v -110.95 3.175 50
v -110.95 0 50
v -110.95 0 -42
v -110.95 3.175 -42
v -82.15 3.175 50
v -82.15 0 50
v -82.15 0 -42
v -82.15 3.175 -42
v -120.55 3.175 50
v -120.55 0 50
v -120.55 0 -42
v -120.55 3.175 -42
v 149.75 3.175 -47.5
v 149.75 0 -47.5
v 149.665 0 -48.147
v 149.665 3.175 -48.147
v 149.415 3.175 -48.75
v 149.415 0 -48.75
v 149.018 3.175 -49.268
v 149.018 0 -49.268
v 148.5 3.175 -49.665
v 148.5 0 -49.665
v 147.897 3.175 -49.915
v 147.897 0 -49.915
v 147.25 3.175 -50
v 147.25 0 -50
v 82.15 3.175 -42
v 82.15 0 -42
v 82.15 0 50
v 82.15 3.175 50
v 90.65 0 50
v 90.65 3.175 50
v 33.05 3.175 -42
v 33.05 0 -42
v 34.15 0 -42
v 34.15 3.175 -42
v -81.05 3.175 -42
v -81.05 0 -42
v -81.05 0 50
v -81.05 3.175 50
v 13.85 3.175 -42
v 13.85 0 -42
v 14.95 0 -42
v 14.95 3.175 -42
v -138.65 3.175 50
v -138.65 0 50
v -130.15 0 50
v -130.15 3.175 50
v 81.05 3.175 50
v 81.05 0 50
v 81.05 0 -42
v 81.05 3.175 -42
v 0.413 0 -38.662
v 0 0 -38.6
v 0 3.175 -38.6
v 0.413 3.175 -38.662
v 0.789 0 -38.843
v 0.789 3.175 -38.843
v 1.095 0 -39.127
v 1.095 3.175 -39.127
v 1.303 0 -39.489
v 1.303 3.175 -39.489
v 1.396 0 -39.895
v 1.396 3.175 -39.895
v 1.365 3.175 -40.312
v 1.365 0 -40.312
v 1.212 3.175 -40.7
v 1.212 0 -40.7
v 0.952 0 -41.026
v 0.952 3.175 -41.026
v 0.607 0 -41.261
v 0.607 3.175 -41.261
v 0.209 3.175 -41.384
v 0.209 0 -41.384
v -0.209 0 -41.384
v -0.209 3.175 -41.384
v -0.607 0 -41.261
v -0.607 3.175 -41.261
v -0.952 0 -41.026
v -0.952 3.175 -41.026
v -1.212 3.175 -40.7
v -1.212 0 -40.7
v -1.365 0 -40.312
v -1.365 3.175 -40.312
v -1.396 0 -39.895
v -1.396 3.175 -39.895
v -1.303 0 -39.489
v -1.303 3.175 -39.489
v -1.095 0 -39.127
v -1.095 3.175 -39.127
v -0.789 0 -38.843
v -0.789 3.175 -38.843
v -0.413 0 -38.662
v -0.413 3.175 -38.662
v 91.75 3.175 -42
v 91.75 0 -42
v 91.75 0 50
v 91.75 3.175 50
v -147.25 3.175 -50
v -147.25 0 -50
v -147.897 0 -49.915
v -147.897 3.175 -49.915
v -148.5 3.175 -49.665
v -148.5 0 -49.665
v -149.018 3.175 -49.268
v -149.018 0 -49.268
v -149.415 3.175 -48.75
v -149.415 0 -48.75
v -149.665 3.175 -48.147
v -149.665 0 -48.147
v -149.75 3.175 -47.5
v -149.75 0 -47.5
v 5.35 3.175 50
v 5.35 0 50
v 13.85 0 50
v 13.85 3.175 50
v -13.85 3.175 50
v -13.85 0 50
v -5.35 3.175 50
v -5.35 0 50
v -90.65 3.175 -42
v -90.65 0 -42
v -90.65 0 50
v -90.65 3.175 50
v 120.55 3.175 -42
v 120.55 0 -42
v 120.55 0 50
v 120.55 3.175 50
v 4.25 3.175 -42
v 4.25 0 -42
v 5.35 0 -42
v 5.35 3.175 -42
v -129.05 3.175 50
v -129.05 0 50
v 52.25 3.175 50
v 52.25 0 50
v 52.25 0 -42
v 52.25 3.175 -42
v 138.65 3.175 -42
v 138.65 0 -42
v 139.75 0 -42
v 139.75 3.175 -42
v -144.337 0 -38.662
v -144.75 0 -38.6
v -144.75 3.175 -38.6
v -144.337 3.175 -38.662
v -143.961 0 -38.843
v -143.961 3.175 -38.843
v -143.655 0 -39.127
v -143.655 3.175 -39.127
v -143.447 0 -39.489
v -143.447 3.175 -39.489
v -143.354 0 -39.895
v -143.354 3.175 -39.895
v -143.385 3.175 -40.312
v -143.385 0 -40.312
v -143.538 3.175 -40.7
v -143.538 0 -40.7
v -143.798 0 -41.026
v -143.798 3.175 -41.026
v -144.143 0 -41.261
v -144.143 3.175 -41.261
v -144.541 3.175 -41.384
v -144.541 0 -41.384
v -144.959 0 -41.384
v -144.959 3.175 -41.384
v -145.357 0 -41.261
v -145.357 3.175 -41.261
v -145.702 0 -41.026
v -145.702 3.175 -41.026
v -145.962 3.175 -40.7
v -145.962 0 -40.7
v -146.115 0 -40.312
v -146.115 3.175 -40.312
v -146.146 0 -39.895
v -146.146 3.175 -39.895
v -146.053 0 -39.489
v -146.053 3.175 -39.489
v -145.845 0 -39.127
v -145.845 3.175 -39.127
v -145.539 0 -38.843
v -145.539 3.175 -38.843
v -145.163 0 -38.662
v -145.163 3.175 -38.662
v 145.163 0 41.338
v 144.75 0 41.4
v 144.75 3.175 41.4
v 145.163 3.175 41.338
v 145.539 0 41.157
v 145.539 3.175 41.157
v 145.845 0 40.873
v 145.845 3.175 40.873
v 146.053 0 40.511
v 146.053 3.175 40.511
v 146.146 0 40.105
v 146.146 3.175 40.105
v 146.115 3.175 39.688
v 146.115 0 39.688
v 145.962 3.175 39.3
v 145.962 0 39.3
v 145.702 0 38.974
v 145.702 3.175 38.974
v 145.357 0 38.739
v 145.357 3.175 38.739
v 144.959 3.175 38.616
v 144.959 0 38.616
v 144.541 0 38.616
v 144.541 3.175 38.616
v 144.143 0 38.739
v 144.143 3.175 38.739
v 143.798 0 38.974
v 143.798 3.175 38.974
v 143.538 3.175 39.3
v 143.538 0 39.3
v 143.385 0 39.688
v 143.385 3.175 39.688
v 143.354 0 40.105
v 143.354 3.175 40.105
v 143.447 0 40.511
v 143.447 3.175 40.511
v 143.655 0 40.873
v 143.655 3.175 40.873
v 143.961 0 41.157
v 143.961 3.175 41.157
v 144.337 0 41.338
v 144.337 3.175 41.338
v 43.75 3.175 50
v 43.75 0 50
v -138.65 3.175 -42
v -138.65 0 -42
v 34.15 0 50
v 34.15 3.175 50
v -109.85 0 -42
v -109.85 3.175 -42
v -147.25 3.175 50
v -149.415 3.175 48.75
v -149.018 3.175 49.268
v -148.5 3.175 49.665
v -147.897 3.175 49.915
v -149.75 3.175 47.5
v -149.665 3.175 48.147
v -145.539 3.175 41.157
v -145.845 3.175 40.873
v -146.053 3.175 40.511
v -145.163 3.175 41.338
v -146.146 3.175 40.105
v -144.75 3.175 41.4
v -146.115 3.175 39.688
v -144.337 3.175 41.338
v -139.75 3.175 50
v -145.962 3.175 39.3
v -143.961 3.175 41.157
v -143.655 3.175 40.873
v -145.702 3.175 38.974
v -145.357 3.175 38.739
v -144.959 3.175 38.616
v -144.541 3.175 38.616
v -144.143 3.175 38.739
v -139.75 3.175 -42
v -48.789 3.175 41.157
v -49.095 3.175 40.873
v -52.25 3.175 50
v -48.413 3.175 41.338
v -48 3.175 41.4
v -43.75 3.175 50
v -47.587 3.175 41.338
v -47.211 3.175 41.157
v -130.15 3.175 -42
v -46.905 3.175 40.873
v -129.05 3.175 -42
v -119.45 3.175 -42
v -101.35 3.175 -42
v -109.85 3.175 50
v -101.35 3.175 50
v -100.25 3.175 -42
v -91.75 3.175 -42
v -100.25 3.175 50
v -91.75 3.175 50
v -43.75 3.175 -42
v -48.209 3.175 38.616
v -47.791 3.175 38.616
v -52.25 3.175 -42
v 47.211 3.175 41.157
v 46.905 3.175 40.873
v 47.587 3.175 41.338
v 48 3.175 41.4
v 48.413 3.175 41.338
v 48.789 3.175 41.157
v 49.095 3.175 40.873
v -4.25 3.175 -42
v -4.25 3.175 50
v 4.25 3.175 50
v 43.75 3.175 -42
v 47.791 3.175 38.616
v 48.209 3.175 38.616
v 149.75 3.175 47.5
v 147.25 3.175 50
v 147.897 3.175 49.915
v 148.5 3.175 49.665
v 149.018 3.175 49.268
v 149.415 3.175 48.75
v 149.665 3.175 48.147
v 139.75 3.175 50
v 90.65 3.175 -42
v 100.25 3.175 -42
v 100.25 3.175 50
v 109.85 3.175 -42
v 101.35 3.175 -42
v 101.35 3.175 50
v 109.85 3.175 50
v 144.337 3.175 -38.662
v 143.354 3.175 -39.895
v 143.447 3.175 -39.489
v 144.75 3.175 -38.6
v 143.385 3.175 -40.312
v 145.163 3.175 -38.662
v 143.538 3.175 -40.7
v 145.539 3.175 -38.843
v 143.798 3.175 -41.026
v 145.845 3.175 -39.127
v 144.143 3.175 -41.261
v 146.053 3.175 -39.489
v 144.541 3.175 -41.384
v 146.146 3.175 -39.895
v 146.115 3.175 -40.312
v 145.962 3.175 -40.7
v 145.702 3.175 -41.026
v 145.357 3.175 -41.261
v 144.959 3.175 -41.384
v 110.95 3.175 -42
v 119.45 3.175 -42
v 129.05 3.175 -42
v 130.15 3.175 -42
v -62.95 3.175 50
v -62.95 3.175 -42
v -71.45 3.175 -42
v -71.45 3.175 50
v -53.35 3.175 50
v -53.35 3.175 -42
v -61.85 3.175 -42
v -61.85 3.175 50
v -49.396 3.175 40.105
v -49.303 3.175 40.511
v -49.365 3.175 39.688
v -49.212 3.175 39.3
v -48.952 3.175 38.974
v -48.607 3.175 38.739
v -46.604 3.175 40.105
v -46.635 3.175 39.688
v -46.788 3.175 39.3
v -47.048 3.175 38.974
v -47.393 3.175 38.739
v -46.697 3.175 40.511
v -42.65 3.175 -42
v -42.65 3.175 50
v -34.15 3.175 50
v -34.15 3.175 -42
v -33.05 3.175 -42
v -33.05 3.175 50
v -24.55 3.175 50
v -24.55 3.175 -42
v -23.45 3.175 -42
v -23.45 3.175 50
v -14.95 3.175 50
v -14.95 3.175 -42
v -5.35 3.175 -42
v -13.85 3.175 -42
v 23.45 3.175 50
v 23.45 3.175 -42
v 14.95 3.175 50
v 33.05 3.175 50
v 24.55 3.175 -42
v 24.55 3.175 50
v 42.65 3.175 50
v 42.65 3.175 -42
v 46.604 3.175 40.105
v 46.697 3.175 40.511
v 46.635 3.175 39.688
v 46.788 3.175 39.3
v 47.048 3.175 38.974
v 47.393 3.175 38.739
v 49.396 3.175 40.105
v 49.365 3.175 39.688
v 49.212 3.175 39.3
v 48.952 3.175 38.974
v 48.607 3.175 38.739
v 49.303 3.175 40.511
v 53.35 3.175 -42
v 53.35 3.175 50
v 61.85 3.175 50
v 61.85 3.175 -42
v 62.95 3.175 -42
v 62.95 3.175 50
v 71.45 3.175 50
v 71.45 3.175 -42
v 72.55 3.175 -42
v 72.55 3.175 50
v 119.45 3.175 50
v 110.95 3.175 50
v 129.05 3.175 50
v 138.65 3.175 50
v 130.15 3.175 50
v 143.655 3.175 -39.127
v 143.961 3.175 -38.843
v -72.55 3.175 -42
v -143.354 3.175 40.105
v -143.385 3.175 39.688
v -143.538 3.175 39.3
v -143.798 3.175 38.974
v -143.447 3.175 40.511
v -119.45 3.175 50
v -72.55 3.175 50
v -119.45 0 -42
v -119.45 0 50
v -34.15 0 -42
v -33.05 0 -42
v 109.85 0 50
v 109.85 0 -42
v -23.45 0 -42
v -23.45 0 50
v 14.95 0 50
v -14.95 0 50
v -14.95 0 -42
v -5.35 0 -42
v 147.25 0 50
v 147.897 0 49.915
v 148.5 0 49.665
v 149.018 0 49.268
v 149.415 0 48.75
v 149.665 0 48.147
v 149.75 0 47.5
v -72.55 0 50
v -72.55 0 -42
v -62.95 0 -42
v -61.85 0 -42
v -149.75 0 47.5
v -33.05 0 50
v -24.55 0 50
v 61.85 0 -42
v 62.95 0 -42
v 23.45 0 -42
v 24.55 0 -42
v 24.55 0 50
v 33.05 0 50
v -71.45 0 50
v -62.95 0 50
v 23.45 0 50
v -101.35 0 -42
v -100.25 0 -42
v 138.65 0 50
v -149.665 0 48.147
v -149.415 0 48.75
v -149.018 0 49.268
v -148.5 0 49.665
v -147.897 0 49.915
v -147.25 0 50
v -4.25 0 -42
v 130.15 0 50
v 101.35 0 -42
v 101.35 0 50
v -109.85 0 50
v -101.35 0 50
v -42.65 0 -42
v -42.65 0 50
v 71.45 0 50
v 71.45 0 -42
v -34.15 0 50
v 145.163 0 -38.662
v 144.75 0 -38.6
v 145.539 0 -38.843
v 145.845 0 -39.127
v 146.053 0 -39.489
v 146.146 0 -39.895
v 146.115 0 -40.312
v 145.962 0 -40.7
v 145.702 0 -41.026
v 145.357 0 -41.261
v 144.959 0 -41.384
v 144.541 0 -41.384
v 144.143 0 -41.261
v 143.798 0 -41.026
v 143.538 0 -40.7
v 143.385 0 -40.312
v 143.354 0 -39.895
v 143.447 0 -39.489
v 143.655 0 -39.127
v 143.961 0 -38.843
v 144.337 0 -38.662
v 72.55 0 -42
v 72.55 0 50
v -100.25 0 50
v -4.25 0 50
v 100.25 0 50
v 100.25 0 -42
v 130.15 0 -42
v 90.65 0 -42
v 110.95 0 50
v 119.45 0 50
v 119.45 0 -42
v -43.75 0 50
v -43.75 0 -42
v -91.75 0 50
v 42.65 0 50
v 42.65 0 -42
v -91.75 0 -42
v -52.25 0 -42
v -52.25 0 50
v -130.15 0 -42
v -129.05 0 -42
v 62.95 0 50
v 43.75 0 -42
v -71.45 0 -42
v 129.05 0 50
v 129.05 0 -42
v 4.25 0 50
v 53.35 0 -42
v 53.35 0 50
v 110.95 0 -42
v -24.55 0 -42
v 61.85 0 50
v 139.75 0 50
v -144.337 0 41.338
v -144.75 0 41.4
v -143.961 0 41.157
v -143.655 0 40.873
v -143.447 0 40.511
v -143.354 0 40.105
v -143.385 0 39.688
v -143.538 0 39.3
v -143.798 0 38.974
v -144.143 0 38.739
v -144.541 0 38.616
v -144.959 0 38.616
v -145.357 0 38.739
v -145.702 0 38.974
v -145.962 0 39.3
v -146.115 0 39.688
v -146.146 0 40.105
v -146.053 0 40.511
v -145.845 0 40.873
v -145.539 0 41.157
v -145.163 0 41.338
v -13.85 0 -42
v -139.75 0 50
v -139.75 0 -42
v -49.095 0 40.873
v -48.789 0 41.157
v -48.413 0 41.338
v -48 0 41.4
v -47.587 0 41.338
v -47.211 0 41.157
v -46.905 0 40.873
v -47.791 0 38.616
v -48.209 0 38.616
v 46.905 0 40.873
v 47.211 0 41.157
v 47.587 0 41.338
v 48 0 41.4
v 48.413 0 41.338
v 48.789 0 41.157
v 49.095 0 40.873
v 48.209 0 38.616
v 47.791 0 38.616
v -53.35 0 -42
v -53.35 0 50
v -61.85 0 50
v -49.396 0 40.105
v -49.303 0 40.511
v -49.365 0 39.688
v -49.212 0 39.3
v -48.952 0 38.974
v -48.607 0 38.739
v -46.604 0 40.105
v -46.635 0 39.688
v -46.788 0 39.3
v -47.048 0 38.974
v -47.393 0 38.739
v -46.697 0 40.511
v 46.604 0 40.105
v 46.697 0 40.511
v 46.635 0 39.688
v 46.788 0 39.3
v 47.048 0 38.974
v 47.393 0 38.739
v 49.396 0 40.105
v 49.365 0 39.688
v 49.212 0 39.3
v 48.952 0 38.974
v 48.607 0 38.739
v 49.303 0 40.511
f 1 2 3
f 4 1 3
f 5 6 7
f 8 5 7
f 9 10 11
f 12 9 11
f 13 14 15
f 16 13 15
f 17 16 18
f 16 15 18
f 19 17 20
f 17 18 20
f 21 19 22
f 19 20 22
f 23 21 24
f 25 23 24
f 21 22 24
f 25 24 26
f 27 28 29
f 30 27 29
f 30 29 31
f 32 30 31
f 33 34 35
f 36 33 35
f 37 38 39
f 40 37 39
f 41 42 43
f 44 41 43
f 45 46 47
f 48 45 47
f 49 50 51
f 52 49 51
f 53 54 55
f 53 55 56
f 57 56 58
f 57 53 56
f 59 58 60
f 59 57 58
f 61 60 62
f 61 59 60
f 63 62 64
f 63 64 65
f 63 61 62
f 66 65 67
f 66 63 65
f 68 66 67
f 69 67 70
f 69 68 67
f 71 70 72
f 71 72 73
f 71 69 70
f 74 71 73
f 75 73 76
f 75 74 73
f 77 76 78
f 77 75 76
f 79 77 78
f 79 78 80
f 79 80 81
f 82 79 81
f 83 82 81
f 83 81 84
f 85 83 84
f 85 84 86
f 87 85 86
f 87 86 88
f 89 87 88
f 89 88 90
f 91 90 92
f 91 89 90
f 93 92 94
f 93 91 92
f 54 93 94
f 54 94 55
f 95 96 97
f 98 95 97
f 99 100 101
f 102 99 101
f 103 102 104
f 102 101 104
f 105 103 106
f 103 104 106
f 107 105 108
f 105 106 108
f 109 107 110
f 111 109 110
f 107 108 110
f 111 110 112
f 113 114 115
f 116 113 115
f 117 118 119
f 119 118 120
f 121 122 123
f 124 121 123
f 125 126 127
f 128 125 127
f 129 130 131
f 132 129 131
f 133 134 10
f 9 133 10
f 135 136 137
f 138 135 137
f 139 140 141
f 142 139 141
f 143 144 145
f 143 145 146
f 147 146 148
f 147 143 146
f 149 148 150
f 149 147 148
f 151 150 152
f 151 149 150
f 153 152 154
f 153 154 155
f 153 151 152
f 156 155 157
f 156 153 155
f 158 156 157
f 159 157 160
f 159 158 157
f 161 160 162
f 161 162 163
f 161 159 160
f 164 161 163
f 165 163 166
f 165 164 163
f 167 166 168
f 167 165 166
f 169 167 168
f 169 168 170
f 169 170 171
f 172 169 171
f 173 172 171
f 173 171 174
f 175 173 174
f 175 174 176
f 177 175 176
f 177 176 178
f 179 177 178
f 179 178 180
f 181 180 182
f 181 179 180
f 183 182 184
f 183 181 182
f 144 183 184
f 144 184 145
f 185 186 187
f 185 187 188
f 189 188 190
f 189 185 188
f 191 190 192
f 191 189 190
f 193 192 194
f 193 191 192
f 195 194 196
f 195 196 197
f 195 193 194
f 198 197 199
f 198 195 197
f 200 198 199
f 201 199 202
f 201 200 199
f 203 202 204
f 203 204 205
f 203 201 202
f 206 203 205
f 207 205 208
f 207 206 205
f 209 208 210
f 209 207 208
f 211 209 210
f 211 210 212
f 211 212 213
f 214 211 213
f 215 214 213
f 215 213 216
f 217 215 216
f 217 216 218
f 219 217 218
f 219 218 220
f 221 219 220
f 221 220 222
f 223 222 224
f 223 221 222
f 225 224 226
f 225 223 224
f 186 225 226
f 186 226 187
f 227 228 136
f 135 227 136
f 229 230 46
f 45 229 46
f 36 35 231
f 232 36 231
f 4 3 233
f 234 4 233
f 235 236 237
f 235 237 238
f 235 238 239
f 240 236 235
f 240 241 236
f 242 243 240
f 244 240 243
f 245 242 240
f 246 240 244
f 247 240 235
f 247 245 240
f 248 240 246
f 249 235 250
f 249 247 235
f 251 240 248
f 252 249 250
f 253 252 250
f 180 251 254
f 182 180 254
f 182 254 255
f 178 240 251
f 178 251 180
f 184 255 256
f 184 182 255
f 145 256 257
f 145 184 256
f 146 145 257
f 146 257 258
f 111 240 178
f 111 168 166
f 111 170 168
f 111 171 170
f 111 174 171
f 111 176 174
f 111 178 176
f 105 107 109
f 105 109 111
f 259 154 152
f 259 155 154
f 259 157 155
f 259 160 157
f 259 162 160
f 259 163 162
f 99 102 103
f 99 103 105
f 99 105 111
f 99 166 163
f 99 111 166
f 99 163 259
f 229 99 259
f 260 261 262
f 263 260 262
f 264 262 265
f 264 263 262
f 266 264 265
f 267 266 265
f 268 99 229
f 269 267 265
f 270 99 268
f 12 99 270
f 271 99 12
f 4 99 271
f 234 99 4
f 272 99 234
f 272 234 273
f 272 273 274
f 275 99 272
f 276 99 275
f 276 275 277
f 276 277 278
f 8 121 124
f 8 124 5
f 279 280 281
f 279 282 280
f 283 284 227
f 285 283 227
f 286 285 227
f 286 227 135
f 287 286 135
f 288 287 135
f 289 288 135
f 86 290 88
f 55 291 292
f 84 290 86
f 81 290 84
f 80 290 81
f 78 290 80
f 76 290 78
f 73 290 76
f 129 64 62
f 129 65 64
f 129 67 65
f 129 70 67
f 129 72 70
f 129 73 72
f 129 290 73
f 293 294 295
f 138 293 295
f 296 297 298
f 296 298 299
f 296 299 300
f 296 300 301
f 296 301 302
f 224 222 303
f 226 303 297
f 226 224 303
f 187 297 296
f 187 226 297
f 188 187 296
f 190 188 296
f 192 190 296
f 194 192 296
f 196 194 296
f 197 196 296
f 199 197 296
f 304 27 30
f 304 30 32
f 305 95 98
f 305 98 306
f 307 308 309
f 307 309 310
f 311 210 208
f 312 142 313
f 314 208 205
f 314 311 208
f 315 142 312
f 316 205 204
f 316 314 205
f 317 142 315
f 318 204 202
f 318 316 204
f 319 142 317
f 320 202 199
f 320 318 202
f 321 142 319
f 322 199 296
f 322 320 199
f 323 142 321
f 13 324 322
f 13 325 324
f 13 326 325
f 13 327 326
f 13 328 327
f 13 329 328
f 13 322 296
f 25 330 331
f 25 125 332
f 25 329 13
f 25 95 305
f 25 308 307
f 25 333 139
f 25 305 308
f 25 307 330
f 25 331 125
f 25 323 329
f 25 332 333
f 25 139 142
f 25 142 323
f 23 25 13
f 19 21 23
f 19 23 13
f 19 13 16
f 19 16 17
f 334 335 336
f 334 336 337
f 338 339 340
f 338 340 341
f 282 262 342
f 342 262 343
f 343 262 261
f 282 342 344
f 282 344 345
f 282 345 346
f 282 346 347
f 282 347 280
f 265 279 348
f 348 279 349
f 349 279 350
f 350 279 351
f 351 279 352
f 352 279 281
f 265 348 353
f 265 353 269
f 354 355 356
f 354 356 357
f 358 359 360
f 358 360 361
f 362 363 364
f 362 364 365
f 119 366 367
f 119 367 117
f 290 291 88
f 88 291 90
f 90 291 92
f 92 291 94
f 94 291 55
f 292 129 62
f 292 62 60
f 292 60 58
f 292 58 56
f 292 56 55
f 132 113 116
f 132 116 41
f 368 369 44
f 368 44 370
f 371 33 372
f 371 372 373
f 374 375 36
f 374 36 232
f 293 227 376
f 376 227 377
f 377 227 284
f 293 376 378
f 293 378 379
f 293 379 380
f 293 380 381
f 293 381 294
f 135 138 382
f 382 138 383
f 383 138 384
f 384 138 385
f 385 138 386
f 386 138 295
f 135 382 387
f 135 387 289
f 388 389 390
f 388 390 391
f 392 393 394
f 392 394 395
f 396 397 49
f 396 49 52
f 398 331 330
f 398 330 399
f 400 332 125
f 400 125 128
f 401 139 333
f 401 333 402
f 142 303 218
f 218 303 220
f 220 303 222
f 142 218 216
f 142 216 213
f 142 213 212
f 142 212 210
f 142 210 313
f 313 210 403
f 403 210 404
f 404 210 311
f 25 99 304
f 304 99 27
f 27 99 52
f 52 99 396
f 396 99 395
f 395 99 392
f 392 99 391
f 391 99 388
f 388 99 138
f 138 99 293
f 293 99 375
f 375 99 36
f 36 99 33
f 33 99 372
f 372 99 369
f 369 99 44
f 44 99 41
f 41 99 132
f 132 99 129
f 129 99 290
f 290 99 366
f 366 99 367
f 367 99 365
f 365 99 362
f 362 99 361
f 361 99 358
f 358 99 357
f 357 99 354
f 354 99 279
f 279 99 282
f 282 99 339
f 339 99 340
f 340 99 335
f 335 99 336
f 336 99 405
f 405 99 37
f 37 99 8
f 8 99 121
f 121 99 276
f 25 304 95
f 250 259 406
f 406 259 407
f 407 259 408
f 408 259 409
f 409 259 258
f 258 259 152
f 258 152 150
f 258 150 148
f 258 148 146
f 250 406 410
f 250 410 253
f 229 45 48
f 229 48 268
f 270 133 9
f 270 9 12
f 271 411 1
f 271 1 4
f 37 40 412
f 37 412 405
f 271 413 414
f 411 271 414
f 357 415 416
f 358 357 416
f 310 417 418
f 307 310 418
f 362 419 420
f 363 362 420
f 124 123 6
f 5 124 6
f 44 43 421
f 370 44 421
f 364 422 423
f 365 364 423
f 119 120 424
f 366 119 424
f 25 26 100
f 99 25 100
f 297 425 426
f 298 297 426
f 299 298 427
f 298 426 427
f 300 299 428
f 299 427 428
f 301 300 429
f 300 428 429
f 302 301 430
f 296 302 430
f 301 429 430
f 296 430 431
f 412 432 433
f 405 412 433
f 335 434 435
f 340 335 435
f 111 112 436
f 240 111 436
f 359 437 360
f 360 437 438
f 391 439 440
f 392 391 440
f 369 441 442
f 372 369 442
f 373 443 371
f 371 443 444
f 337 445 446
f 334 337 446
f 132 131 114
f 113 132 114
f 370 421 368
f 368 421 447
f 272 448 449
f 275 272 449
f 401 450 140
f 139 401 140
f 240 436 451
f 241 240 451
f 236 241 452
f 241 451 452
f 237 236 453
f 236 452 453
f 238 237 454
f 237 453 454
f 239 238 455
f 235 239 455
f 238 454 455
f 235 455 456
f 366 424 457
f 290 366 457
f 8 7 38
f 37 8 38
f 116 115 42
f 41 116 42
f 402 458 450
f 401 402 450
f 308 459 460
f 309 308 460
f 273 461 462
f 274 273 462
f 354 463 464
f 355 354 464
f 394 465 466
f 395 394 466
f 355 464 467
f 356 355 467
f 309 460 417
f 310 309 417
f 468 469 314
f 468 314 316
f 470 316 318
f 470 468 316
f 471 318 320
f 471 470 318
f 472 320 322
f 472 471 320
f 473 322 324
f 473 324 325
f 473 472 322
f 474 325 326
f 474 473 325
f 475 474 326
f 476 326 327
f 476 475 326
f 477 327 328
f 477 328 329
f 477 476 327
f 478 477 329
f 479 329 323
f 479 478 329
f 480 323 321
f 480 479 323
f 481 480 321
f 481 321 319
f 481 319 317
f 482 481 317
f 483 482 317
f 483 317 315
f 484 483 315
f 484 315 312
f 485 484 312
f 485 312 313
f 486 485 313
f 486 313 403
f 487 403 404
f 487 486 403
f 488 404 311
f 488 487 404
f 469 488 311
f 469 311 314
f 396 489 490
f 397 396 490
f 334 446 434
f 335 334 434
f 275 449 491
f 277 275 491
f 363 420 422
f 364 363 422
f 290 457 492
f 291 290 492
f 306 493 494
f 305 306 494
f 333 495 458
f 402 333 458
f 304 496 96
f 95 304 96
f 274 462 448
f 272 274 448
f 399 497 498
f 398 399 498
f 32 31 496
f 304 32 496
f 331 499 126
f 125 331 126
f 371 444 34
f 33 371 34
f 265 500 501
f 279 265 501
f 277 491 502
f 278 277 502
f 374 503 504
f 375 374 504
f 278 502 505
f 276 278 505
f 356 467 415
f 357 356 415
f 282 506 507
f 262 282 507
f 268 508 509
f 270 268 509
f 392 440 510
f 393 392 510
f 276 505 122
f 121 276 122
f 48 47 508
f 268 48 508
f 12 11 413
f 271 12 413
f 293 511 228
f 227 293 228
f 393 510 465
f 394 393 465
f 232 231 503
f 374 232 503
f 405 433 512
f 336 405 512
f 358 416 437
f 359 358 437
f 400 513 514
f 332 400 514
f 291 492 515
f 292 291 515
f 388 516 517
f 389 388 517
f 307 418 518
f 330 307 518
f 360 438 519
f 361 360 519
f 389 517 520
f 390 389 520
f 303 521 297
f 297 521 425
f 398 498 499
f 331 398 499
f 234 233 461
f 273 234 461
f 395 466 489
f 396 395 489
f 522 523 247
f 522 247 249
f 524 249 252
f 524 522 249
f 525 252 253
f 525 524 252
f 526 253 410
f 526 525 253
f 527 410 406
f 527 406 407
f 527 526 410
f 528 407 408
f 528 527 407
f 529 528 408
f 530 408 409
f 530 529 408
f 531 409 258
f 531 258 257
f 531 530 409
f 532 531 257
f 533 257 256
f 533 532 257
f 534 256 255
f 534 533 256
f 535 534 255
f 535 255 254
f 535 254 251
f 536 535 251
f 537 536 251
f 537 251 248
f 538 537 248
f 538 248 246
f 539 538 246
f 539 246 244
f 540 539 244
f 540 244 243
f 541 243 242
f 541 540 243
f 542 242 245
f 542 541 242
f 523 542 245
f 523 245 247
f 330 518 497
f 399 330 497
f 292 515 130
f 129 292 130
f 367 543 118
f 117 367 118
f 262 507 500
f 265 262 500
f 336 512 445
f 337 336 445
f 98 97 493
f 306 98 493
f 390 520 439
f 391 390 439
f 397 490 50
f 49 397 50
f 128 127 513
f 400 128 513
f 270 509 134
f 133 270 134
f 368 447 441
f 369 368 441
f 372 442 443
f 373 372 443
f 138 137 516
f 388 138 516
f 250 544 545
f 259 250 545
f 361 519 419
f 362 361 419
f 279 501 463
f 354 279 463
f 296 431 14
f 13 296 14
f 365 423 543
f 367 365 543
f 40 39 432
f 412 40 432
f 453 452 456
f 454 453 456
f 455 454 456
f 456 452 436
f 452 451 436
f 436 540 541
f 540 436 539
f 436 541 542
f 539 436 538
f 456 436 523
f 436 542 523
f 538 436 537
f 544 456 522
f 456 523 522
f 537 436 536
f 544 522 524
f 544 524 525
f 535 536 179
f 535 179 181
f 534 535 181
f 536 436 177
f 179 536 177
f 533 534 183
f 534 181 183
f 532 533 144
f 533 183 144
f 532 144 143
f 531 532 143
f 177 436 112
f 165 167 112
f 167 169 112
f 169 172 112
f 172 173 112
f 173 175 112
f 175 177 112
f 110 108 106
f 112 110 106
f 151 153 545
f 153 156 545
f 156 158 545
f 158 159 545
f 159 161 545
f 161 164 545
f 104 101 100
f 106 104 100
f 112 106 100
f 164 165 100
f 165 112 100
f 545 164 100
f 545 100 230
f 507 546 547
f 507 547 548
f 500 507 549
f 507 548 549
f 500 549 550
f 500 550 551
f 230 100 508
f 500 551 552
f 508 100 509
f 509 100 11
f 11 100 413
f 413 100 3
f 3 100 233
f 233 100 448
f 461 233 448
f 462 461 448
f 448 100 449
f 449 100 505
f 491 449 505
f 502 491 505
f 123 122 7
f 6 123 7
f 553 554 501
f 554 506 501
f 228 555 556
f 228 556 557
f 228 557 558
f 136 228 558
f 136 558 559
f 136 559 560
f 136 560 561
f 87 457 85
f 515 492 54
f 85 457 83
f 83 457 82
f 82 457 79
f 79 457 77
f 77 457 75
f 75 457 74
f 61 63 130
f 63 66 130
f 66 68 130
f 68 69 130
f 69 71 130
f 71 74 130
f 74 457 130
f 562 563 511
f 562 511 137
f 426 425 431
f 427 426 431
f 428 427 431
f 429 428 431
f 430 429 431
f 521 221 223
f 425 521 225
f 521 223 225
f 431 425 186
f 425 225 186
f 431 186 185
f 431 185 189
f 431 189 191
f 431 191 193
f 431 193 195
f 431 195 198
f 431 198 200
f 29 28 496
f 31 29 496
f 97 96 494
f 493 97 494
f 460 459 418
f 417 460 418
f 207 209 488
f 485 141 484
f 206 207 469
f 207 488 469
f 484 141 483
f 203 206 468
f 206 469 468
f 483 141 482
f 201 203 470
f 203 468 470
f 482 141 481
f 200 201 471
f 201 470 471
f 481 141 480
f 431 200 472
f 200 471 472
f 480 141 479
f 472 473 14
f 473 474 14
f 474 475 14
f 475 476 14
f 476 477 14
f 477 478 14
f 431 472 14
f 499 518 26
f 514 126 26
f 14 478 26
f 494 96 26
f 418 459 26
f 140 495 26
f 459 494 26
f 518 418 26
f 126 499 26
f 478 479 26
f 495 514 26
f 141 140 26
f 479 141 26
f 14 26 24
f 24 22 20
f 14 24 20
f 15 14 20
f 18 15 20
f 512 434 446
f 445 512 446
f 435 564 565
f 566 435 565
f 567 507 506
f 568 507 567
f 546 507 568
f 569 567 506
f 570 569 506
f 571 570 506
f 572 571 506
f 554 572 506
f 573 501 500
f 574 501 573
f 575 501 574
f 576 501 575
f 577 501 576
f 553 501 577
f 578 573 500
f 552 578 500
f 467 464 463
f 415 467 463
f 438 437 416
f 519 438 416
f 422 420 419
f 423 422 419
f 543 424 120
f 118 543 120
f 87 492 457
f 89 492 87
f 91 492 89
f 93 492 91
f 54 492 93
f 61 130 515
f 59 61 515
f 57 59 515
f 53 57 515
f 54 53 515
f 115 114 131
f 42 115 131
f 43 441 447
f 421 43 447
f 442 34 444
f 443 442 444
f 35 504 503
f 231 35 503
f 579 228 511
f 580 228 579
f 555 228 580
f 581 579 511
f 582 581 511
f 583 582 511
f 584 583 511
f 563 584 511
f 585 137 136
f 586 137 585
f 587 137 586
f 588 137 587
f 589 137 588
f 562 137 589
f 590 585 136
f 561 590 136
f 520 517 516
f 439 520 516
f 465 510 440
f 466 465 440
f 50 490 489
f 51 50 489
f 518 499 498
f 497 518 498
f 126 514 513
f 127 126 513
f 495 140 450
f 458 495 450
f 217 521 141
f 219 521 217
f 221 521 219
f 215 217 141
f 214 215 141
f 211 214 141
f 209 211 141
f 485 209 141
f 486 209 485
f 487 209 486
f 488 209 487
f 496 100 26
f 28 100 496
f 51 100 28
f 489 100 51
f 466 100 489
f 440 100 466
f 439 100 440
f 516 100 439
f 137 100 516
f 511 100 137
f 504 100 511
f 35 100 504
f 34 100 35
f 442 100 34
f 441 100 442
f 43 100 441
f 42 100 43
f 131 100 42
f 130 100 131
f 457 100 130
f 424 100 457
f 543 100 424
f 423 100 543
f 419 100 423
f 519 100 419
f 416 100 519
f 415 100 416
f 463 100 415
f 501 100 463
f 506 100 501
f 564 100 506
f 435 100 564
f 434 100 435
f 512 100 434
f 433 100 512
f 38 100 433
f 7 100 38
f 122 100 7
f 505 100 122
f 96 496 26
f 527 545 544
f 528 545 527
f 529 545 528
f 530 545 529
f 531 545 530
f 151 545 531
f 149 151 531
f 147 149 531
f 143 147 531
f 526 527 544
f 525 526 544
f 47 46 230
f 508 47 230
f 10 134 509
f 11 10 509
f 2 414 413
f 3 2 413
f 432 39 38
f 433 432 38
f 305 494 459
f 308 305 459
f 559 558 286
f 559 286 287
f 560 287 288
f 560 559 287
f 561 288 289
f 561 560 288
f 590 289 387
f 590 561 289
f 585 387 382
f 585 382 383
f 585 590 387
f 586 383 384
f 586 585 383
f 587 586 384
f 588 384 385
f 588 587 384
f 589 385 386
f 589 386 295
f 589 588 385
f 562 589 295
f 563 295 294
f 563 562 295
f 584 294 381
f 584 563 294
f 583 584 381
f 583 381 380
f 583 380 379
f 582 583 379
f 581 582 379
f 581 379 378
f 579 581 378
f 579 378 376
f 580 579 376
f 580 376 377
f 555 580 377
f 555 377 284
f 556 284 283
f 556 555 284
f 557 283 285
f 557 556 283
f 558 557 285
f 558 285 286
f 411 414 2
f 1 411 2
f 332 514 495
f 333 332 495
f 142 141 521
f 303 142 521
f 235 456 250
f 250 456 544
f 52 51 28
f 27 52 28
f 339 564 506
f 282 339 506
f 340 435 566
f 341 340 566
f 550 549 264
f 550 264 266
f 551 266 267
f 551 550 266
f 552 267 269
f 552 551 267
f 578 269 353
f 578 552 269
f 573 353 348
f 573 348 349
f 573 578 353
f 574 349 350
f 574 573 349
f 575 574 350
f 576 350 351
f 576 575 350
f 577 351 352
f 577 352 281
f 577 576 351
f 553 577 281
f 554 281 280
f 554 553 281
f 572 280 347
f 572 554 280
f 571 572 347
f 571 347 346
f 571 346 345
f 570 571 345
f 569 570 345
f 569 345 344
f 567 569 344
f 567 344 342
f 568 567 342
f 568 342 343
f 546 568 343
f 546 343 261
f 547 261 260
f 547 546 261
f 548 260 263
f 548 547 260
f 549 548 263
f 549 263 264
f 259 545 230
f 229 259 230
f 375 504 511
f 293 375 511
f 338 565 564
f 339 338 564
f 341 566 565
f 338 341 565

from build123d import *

# Parameters (mm, degrees)
SKETCH3_R           = 1.4
BOSS_EXTRUDE1_DEPTH = 3.175


with BuildPart() as part:
    # Sketch3 → Boss-Extrude1 (new body)
    with BuildSketch(Plane(origin=(0, 0, 0), x_dir=(1, 0, 0), z_dir=(0, 1, 0))):
        with BuildLine():
            Line((-72.55, 42), (-71.45, 42))
            Line((-71.45, 42), (-71.45, -50))
            Line((-71.45, -50), (-62.95, -50))
            Line((-62.95, -50), (-62.95, 42))
            Line((-62.95, 42), (-61.85, 42))
            Line((-61.85, 42), (-61.85, -50))
            Line((-61.85, -50), (-53.35, -50))
            Line((-53.35, -50), (-53.35, 42))
            Line((-53.35, 42), (-52.25, 42))
            Line((-52.25, 42), (-52.25, -50))
            Line((-52.25, -50), (-43.75, -50))
            Line((-43.75, -50), (-43.75, 42))
            Line((-43.75, 42), (-42.65, 42))
            Line((-42.65, 42), (-42.65, -50))
            Line((-42.65, -50), (-34.15, -50))
            Line((-34.15, -50), (-34.15, 42))
            Line((-34.15, 42), (-33.05, 42))
            Line((-33.05, 42), (-33.05, -50))
            Line((-33.05, -50), (-24.55, -50))
            Line((-24.55, -50), (-24.55, 42))
            Line((-24.55, 42), (-23.45, 42))
            Line((-23.45, 42), (-23.45, -50))
            Line((-23.45, -50), (-14.95, -50))
            Line((-14.95, -50), (-14.95, 42))
            Line((-14.95, 42), (-13.85, 42))
            Line((-13.85, 42), (-13.85, -50))
            Line((-13.85, -50), (-5.35, -50))
            Line((-5.35, -50), (-5.35, 42))
            Line((-5.35, 42), (-4.25, 42))
            Line((-4.25, 42), (-4.25, -50))
            Line((-4.25, -50), (4.25, -50))
            Line((4.25, -50), (4.25, 42))
            Line((4.25, 42), (5.35, 42))
            Line((5.35, 42), (5.35, -50))
            Line((5.35, -50), (13.85, -50))
            Line((13.85, -50), (13.85, 42))
            Line((13.85, 42), (14.95, 42))
            Line((14.95, 42), (14.95, -50))
            Line((14.95, -50), (23.45, -50))
            Line((23.45, -50), (23.45, 42))
            Line((23.45, 42), (24.55, 42))
            Line((24.55, 42), (24.55, -50))
            Line((24.55, -50), (33.05, -50))
            Line((33.05, -50), (33.05, 42))
            Line((33.05, 42), (34.15, 42))
            Line((34.15, 42), (34.15, -50))
            Line((34.15, -50), (42.65, -50))
            Line((42.65, -50), (42.65, 42))
            Line((42.65, 42), (43.75, 42))
            Line((43.75, 42), (43.75, -50))
            Line((43.75, -50), (52.25, -50))
            Line((52.25, -50), (52.25, 42))
            Line((52.25, 42), (53.35, 42))
            Line((53.35, 42), (53.35, -50))
            Line((53.35, -50), (61.85, -50))
            Line((61.85, -50), (61.85, 42))
            Line((61.85, 42), (62.95, 42))
            Line((62.95, 42), (62.95, -50))
            Line((62.95, -50), (71.45, -50))
            Line((71.45, -50), (71.45, 42))
            Line((71.45, 42), (72.55, 42))
            Line((72.55, 42), (72.55, -50))
            Line((72.55, -50), (81.05, -50))
            Line((81.05, -50), (81.05, 42))
            Line((81.05, 42), (82.15, 42))
            Line((82.15, 42), (82.15, -50))
            Line((82.15, -50), (90.65, -50))
            Line((90.65, -50), (90.65, 42))
            Line((90.65, 42), (91.75, 42))
            Line((91.75, 42), (91.75, -50))
            Line((91.75, -50), (100.25, -50))
            Line((100.25, -50), (100.25, 42))
            Line((100.25, 42), (101.35, 42))
            Line((101.35, 42), (101.35, -50))
            Line((101.35, -50), (109.85, -50))
            Line((109.85, -50), (109.85, 42))
            Line((109.85, 42), (110.95, 42))
            Line((110.95, 42), (110.95, -50))
            Line((110.95, -50), (119.45, -50))
            Line((119.45, -50), (119.45, 42))
            Line((119.45, 42), (120.55, 42))
            Line((120.55, 42), (120.55, -50))
            Line((120.55, -50), (129.05, -50))
            Line((129.05, -50), (129.05, 42))
            Line((129.05, 42), (130.15, 42))
            Line((130.15, 42), (130.15, -50))
            Line((130.15, -50), (138.65, -50))
            Line((138.65, -50), (138.65, 42))
            Line((138.65, 42), (139.75, 42))
            Line((139.75, 42), (139.75, -50))
            Line((139.75, -50), (147.25, -50))
            ThreePointArc((147.25, -50), (149.017766953, -49.267766953), (149.75, -47.5))
            Line((149.75, -47.5), (149.75, 47.5))
            ThreePointArc((149.75, 47.5), (149.017766953, 49.267766953), (147.25, 50))
            Line((147.25, 50), (-147.25, 50))
            ThreePointArc((-147.25, 50), (-149.017766953, 49.267766953), (-149.75, 47.5))
            Line((-149.75, 47.5), (-149.75, -47.5))
            ThreePointArc((-149.75, -47.5), (-149.017766953, -49.267766953), (-147.25, -50))
            Line((-147.25, -50), (-139.75, -50))
            Line((-139.75, -50), (-139.75, 42))
            Line((-139.75, 42), (-138.65, 42))
            Line((-138.65, 42), (-138.65, -50))
            Line((-138.65, -50), (-130.15, -50))
            Line((-130.15, -50), (-130.15, 42))
            Line((-130.15, 42), (-129.05, 42))
            Line((-129.05, 42), (-129.05, -50))
            Line((-129.05, -50), (-120.55, -50))
            Line((-120.55, -50), (-120.55, 42))
            Line((-120.55, 42), (-119.45, 42))
            Line((-119.45, 42), (-119.45, -50))
            Line((-119.45, -50), (-110.95, -50))
            Line((-110.95, -50), (-110.95, 42))
            Line((-110.95, 42), (-109.85, 42))
            Line((-109.85, 42), (-109.85, -50))
            Line((-109.85, -50), (-101.35, -50))
            Line((-101.35, -50), (-101.35, 42))
            Line((-101.35, 42), (-100.25, 42))
            Line((-100.25, 42), (-100.25, -50))
            Line((-100.25, -50), (-91.75, -50))
            Line((-91.75, -50), (-91.75, 42))
            Line((-91.75, 42), (-90.65, 42))
            Line((-90.65, 42), (-90.65, -50))
            Line((-90.65, -50), (-82.15, -50))
            Line((-82.15, -50), (-82.15, 42))
            Line((-82.15, 42), (-81.05, 42))
            Line((-81.05, 42), (-81.05, -50))
            Line((-81.05, -50), (-72.55, -50))
            Line((-72.55, -50), (-72.55, 42))
        make_face()
        with Locations(Location((-144.75, -40, 0), (0, 0, 270))):
            Circle(SKETCH3_R, mode=Mode.SUBTRACT)
        with Locations(Location((-48, -40, 0), (0, 0, 270))):
            Circle(SKETCH3_R, mode=Mode.SUBTRACT)
        with Locations(Location((48, -40, 0), (0, 0, 270))):
            Circle(SKETCH3_R, mode=Mode.SUBTRACT)
        with Locations(Location((144.75, -40, 0), (0, 0, 270))):
            Circle(SKETCH3_R, mode=Mode.SUBTRACT)
        with Locations(Location((-144.75, 40, 0), (0, 0, 270))):
            Circle(SKETCH3_R, mode=Mode.SUBTRACT)
        with Locations(Location((0, 40, 0), (0, 0, 270))):
            Circle(SKETCH3_R, mode=Mode.SUBTRACT)
        with Locations(Location((144.75, 40, 0), (0, 0, 270))):
            Circle(SKETCH3_R, mode=Mode.SUBTRACT)
    extrude(amount=BOSS_EXTRUDE1_DEPTH)


solid = part.part
